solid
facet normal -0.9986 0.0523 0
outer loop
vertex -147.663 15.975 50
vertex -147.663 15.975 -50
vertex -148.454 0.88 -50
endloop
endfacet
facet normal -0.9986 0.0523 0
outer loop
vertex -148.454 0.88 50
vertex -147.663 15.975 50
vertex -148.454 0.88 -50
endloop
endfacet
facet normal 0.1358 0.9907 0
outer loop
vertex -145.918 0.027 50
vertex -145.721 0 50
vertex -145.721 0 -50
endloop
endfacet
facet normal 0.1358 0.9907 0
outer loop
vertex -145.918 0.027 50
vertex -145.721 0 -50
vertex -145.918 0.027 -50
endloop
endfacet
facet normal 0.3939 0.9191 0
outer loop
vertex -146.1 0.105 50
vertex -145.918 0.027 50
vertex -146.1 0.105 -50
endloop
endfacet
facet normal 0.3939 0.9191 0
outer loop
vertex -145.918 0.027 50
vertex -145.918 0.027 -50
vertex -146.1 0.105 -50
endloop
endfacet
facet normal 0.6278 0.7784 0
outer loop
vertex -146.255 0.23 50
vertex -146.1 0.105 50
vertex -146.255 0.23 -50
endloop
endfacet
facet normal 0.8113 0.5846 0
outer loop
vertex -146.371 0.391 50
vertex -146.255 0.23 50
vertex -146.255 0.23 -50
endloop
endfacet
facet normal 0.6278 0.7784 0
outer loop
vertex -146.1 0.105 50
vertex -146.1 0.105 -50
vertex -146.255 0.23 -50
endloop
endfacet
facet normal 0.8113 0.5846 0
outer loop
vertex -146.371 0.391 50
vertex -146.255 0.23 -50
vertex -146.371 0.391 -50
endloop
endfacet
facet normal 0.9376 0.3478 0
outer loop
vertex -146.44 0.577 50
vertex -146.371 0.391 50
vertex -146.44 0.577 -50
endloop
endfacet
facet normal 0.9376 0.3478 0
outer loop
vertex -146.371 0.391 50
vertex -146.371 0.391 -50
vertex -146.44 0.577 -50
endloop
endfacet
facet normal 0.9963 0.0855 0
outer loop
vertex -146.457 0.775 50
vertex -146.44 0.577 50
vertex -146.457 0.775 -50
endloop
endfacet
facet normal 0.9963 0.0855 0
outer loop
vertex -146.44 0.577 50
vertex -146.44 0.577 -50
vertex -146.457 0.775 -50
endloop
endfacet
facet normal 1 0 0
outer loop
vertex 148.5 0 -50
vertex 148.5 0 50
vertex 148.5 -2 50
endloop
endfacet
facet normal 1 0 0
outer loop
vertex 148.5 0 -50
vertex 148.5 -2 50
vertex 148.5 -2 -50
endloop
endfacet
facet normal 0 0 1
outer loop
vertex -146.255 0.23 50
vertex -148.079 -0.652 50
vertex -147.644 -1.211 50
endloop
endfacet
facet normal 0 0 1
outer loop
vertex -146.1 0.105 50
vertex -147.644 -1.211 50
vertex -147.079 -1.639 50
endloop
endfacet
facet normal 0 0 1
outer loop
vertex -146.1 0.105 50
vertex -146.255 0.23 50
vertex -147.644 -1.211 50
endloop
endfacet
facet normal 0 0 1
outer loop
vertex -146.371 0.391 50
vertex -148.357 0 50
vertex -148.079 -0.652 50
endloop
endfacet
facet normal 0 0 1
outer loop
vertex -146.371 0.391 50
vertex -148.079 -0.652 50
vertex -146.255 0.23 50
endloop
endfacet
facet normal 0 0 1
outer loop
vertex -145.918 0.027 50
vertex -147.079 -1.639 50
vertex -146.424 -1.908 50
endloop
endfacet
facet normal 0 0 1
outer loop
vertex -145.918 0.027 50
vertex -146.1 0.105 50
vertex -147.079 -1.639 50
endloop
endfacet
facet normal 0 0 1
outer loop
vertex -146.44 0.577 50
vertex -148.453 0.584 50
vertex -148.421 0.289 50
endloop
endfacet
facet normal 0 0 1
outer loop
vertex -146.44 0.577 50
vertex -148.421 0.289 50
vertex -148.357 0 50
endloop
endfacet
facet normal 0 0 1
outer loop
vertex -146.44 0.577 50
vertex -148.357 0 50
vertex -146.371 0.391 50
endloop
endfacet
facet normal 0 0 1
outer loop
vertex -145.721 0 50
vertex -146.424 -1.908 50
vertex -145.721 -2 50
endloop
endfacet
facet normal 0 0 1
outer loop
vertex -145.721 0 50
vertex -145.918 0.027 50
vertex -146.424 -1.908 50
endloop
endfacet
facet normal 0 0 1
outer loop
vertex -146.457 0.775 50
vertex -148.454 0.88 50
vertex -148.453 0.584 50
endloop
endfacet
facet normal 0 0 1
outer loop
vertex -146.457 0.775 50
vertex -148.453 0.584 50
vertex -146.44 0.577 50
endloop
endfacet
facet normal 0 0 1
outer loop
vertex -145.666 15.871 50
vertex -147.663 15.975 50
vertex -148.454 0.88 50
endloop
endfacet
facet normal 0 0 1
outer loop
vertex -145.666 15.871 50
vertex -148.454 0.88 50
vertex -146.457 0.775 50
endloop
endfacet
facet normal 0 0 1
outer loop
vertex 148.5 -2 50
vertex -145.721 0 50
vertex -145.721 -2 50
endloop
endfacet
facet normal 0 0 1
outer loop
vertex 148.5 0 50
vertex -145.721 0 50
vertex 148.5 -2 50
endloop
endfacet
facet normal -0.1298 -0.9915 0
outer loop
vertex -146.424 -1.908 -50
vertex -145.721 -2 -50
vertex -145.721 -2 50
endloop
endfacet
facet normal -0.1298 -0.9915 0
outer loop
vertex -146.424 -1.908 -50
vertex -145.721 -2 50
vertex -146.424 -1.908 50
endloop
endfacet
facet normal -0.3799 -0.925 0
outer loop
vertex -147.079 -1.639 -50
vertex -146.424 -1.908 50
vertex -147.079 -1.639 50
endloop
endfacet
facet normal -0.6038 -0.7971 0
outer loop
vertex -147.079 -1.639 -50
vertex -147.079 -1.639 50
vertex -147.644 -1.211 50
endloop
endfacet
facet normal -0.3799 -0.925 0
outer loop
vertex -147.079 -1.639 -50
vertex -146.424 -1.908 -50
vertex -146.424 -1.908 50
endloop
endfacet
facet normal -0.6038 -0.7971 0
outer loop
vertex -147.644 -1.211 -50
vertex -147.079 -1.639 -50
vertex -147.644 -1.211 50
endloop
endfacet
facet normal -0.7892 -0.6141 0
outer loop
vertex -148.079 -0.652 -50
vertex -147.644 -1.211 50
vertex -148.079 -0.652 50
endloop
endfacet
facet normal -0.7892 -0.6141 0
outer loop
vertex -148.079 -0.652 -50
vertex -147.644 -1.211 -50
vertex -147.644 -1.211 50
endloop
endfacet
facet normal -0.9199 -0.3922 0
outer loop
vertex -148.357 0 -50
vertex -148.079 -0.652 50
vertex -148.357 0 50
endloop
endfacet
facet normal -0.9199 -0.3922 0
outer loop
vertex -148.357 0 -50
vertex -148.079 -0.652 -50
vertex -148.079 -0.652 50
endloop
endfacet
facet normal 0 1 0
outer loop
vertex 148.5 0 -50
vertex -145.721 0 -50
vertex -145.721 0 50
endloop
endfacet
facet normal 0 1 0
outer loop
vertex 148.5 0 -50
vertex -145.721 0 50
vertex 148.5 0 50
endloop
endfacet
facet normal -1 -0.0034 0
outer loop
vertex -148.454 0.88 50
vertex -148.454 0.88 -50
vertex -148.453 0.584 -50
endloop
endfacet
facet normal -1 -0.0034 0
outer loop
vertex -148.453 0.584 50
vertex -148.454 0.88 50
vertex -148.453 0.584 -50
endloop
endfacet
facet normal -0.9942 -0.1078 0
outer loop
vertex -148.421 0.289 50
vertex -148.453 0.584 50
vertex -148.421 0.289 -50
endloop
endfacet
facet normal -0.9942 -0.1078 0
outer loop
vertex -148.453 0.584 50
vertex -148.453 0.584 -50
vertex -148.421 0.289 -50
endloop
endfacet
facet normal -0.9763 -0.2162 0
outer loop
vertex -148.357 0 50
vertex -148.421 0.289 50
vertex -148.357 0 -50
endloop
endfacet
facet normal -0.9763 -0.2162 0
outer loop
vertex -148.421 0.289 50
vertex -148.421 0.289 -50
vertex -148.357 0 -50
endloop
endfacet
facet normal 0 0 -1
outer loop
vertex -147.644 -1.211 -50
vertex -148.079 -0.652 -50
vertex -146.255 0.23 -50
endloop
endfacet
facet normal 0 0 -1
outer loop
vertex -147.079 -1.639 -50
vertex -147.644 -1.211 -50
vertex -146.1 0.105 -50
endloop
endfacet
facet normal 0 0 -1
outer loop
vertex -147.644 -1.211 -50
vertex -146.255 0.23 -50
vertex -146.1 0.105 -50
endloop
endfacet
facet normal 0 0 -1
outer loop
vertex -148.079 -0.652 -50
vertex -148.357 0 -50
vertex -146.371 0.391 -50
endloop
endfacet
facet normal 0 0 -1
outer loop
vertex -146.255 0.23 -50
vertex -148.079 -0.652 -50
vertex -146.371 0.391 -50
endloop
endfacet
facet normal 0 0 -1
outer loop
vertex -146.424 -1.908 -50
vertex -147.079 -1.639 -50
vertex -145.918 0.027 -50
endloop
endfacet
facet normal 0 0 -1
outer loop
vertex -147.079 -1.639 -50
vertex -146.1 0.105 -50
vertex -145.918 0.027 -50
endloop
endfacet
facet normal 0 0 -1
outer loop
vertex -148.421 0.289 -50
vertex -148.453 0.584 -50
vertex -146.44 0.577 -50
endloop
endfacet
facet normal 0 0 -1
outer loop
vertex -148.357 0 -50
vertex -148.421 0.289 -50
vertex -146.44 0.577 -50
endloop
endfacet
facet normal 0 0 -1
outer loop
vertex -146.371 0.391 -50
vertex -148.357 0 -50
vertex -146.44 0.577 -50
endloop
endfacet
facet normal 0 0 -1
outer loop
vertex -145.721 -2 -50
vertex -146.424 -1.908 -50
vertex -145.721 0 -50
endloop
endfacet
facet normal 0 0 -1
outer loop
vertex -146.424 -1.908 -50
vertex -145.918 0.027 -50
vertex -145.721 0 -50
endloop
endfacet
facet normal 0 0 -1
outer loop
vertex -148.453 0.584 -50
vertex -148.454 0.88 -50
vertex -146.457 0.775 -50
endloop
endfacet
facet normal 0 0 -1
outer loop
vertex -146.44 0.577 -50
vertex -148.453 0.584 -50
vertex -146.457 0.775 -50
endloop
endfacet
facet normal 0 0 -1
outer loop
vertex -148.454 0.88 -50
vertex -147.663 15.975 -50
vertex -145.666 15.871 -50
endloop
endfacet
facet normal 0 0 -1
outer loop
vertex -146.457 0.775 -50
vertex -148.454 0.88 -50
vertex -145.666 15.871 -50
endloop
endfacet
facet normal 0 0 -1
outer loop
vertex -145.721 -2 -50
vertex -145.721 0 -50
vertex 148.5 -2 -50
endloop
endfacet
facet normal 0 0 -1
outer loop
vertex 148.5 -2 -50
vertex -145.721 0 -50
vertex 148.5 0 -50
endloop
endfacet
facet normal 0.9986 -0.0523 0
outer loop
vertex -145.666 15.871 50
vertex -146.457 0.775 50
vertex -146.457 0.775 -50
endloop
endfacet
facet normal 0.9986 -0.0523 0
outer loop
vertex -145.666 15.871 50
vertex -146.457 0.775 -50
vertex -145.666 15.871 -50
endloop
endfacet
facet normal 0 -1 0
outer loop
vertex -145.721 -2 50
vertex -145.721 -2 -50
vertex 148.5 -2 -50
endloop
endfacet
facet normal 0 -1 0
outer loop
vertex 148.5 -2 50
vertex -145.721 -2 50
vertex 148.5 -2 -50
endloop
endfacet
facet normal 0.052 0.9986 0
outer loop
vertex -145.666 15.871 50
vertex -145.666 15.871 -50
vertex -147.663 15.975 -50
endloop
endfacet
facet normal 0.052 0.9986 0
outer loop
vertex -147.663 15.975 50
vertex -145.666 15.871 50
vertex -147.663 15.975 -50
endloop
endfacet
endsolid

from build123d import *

# Parameters (mm, degrees)
SKETCH1_W            = 297
SKETCH1_H            = 100
BASE_FLANGE1_DEPTH   = 2
EDGE_FLANGE1_START   = -50
EDGE_FLANGE1_DEPTH   = 100
EDGE_FLANGE1_2_DEPTH = 100


# Read off the part's stored shape, not the designer's step: Edge-Flange1
# Sheet-metal steps are written as plain solids
with BuildPart() as part:
    # Sketch1 → Base-Flange1 (new body)
    with BuildSketch(Plane(origin=(0, 0, 0), x_dir=(1, 0, 0), z_dir=(0, 1, 0))):
        Rectangle(SKETCH1_W, SKETCH1_H)
    extrude(amount=-BASE_FLANGE1_DEPTH)

    # Edge-Flange1 outline → Edge-Flange1 (cut)
    with BuildSketch(Plane.XY.offset(EDGE_FLANGE1_START)):
        with BuildLine():
            ThreePointArc((-145.721040868, -2), (-147.375308077, -1.443395312), (-148.356643266, 0))
            Line((-148.356643266, 0), (-148.5, 0))
            Line((-148.5, 0), (-148.5, -2))
            Line((-148.5, -2), (-145.721040868, -2))
        make_face()
    extrude(amount=EDGE_FLANGE1_DEPTH, mode=Mode.SUBTRACT)

    # Edge-Flange1 2 outline → Edge-Flange1 2 (add)
    with BuildSketch(Plane.XY.offset(EDGE_FLANGE1_START)):
        with BuildLine():
            Line((-147.662768346, 15.975331626), (-148.453890453, 0.879822578))
            ThreePointArc((-148.453890453, 0.879822578), (-148.441075999, 0.435953289), (-148.356643266, 0))
            Line((-148.356643266, 0), (-145.721040868, 0))
            ThreePointArc((-145.721040868, 0), (-146.255351629, 0.22955802), (-146.456631383, 0.775150665))
            Line((-146.456631383, 0.775150665), (-145.665509277, 15.870659713))
            Line((-145.665509277, 15.870659713), (-147.662768346, 15.975331626))
        make_face()
    extrude(amount=EDGE_FLANGE1_2_DEPTH)


solid = part.part
